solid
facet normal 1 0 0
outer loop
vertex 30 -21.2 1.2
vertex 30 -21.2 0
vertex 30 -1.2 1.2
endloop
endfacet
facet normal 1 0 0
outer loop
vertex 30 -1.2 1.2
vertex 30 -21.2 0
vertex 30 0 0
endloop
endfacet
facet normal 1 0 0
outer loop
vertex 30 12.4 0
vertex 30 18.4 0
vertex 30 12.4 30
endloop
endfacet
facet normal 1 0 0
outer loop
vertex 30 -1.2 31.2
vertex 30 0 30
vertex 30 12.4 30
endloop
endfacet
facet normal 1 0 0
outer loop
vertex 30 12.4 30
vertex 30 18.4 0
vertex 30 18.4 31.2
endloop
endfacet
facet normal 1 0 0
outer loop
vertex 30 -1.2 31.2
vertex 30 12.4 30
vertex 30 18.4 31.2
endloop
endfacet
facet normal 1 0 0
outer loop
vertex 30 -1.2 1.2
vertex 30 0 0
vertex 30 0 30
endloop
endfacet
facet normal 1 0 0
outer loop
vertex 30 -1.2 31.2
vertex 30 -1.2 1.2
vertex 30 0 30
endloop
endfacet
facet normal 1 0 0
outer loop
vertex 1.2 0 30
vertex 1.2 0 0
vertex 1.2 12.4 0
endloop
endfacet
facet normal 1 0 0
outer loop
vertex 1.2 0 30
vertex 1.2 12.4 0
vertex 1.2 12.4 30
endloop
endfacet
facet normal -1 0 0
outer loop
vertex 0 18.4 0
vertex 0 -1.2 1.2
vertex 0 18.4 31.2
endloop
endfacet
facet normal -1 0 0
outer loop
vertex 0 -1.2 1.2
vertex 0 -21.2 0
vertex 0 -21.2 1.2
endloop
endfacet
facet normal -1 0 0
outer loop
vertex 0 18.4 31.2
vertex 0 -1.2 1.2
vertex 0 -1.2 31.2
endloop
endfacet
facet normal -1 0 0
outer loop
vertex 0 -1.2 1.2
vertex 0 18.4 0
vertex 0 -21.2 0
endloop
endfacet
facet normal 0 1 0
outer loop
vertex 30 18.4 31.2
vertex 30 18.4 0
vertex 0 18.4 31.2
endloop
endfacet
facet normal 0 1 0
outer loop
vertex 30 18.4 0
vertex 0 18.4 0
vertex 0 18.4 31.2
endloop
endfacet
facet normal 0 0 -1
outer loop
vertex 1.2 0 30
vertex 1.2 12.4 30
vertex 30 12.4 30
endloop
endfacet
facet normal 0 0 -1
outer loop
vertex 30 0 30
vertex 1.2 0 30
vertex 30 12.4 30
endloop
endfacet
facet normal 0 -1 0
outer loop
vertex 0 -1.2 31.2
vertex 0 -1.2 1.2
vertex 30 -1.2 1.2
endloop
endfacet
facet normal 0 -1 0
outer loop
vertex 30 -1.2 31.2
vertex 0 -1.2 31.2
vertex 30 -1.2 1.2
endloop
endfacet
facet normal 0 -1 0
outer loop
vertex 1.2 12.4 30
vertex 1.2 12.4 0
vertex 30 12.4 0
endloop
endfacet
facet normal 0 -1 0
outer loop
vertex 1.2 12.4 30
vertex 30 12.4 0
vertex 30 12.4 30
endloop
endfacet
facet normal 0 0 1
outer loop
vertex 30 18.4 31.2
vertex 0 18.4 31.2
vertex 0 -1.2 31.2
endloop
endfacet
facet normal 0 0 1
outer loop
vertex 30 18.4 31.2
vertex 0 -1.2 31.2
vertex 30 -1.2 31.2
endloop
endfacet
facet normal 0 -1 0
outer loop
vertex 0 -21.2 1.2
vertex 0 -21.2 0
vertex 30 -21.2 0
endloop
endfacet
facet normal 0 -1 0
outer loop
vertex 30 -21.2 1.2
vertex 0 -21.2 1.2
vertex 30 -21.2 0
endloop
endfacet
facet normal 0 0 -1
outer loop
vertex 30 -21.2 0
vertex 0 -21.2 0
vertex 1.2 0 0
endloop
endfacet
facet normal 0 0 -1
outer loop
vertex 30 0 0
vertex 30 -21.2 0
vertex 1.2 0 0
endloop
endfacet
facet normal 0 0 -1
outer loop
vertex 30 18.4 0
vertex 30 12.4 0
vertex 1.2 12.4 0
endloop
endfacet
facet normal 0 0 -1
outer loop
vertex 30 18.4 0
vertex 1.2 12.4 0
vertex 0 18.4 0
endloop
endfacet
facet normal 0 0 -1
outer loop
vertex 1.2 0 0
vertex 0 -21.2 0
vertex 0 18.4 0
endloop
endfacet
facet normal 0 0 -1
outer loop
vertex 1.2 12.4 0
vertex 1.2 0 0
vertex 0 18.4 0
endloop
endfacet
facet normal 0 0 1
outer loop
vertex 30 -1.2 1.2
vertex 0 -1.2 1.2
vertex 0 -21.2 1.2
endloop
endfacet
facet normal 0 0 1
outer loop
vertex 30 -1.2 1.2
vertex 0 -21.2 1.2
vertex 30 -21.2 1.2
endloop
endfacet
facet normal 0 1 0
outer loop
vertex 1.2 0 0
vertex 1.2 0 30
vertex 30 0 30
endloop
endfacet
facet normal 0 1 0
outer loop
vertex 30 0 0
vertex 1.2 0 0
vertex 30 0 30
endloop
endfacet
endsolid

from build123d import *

# Parameters (mm, degrees)
F0_W     = 30
F0_H     = 21.2
F1_DEPTH = 1.2
F2_W     = 30
F2_H     = 1.2
F3_DEPTH = 30
F4_W     = 1.2
F4_H     = 31.2
F5_DEPTH = 18.4
F6_W     = 6
F6_H     = 31.2
F7_DEPTH = 28.8
F8_W     = 28.8
F8_H     = 1.2
F9_DEPTH = 12.4


with BuildPart() as f1:
    # F0 (on Top) → F1 (new body)
    with BuildSketch(Plane.XY):
        with Locations((15, -10.6)):
            Rectangle(F0_W, F0_H)
    extrude(amount=F1_DEPTH)

    # F2 (on face) → F3 (join)
    with BuildSketch(Plane.XY.offset(1.2)):
        with Locations((15, -0.6)):
            Rectangle(F2_W, F2_H)
    extrude(amount=F3_DEPTH)

    # F4 (on face) → F5 (join)
    with BuildSketch(Plane(origin=(0, 0, 0), x_dir=(-1, 0, 0), z_dir=(0, 1, 0))):
        with Locations((-0.6, 15.6)):
            Rectangle(F4_W, F4_H)
    extrude(amount=F5_DEPTH)

    # F6 (on face) → F7 (join)
    with BuildSketch(Plane.YZ.offset(1.2)):
        with Locations((15.4, 15.6)):
            Rectangle(F6_W, F6_H)
    extrude(amount=F7_DEPTH)

    # F8 (on face) → F9 (join, through all)
    with BuildSketch(Plane.XZ.offset(-12.4)):
        with Locations((15.6, 30.6)):
            Rectangle(F8_W, F8_H)
    extrude(amount=F9_DEPTH)


solid = f1.part
